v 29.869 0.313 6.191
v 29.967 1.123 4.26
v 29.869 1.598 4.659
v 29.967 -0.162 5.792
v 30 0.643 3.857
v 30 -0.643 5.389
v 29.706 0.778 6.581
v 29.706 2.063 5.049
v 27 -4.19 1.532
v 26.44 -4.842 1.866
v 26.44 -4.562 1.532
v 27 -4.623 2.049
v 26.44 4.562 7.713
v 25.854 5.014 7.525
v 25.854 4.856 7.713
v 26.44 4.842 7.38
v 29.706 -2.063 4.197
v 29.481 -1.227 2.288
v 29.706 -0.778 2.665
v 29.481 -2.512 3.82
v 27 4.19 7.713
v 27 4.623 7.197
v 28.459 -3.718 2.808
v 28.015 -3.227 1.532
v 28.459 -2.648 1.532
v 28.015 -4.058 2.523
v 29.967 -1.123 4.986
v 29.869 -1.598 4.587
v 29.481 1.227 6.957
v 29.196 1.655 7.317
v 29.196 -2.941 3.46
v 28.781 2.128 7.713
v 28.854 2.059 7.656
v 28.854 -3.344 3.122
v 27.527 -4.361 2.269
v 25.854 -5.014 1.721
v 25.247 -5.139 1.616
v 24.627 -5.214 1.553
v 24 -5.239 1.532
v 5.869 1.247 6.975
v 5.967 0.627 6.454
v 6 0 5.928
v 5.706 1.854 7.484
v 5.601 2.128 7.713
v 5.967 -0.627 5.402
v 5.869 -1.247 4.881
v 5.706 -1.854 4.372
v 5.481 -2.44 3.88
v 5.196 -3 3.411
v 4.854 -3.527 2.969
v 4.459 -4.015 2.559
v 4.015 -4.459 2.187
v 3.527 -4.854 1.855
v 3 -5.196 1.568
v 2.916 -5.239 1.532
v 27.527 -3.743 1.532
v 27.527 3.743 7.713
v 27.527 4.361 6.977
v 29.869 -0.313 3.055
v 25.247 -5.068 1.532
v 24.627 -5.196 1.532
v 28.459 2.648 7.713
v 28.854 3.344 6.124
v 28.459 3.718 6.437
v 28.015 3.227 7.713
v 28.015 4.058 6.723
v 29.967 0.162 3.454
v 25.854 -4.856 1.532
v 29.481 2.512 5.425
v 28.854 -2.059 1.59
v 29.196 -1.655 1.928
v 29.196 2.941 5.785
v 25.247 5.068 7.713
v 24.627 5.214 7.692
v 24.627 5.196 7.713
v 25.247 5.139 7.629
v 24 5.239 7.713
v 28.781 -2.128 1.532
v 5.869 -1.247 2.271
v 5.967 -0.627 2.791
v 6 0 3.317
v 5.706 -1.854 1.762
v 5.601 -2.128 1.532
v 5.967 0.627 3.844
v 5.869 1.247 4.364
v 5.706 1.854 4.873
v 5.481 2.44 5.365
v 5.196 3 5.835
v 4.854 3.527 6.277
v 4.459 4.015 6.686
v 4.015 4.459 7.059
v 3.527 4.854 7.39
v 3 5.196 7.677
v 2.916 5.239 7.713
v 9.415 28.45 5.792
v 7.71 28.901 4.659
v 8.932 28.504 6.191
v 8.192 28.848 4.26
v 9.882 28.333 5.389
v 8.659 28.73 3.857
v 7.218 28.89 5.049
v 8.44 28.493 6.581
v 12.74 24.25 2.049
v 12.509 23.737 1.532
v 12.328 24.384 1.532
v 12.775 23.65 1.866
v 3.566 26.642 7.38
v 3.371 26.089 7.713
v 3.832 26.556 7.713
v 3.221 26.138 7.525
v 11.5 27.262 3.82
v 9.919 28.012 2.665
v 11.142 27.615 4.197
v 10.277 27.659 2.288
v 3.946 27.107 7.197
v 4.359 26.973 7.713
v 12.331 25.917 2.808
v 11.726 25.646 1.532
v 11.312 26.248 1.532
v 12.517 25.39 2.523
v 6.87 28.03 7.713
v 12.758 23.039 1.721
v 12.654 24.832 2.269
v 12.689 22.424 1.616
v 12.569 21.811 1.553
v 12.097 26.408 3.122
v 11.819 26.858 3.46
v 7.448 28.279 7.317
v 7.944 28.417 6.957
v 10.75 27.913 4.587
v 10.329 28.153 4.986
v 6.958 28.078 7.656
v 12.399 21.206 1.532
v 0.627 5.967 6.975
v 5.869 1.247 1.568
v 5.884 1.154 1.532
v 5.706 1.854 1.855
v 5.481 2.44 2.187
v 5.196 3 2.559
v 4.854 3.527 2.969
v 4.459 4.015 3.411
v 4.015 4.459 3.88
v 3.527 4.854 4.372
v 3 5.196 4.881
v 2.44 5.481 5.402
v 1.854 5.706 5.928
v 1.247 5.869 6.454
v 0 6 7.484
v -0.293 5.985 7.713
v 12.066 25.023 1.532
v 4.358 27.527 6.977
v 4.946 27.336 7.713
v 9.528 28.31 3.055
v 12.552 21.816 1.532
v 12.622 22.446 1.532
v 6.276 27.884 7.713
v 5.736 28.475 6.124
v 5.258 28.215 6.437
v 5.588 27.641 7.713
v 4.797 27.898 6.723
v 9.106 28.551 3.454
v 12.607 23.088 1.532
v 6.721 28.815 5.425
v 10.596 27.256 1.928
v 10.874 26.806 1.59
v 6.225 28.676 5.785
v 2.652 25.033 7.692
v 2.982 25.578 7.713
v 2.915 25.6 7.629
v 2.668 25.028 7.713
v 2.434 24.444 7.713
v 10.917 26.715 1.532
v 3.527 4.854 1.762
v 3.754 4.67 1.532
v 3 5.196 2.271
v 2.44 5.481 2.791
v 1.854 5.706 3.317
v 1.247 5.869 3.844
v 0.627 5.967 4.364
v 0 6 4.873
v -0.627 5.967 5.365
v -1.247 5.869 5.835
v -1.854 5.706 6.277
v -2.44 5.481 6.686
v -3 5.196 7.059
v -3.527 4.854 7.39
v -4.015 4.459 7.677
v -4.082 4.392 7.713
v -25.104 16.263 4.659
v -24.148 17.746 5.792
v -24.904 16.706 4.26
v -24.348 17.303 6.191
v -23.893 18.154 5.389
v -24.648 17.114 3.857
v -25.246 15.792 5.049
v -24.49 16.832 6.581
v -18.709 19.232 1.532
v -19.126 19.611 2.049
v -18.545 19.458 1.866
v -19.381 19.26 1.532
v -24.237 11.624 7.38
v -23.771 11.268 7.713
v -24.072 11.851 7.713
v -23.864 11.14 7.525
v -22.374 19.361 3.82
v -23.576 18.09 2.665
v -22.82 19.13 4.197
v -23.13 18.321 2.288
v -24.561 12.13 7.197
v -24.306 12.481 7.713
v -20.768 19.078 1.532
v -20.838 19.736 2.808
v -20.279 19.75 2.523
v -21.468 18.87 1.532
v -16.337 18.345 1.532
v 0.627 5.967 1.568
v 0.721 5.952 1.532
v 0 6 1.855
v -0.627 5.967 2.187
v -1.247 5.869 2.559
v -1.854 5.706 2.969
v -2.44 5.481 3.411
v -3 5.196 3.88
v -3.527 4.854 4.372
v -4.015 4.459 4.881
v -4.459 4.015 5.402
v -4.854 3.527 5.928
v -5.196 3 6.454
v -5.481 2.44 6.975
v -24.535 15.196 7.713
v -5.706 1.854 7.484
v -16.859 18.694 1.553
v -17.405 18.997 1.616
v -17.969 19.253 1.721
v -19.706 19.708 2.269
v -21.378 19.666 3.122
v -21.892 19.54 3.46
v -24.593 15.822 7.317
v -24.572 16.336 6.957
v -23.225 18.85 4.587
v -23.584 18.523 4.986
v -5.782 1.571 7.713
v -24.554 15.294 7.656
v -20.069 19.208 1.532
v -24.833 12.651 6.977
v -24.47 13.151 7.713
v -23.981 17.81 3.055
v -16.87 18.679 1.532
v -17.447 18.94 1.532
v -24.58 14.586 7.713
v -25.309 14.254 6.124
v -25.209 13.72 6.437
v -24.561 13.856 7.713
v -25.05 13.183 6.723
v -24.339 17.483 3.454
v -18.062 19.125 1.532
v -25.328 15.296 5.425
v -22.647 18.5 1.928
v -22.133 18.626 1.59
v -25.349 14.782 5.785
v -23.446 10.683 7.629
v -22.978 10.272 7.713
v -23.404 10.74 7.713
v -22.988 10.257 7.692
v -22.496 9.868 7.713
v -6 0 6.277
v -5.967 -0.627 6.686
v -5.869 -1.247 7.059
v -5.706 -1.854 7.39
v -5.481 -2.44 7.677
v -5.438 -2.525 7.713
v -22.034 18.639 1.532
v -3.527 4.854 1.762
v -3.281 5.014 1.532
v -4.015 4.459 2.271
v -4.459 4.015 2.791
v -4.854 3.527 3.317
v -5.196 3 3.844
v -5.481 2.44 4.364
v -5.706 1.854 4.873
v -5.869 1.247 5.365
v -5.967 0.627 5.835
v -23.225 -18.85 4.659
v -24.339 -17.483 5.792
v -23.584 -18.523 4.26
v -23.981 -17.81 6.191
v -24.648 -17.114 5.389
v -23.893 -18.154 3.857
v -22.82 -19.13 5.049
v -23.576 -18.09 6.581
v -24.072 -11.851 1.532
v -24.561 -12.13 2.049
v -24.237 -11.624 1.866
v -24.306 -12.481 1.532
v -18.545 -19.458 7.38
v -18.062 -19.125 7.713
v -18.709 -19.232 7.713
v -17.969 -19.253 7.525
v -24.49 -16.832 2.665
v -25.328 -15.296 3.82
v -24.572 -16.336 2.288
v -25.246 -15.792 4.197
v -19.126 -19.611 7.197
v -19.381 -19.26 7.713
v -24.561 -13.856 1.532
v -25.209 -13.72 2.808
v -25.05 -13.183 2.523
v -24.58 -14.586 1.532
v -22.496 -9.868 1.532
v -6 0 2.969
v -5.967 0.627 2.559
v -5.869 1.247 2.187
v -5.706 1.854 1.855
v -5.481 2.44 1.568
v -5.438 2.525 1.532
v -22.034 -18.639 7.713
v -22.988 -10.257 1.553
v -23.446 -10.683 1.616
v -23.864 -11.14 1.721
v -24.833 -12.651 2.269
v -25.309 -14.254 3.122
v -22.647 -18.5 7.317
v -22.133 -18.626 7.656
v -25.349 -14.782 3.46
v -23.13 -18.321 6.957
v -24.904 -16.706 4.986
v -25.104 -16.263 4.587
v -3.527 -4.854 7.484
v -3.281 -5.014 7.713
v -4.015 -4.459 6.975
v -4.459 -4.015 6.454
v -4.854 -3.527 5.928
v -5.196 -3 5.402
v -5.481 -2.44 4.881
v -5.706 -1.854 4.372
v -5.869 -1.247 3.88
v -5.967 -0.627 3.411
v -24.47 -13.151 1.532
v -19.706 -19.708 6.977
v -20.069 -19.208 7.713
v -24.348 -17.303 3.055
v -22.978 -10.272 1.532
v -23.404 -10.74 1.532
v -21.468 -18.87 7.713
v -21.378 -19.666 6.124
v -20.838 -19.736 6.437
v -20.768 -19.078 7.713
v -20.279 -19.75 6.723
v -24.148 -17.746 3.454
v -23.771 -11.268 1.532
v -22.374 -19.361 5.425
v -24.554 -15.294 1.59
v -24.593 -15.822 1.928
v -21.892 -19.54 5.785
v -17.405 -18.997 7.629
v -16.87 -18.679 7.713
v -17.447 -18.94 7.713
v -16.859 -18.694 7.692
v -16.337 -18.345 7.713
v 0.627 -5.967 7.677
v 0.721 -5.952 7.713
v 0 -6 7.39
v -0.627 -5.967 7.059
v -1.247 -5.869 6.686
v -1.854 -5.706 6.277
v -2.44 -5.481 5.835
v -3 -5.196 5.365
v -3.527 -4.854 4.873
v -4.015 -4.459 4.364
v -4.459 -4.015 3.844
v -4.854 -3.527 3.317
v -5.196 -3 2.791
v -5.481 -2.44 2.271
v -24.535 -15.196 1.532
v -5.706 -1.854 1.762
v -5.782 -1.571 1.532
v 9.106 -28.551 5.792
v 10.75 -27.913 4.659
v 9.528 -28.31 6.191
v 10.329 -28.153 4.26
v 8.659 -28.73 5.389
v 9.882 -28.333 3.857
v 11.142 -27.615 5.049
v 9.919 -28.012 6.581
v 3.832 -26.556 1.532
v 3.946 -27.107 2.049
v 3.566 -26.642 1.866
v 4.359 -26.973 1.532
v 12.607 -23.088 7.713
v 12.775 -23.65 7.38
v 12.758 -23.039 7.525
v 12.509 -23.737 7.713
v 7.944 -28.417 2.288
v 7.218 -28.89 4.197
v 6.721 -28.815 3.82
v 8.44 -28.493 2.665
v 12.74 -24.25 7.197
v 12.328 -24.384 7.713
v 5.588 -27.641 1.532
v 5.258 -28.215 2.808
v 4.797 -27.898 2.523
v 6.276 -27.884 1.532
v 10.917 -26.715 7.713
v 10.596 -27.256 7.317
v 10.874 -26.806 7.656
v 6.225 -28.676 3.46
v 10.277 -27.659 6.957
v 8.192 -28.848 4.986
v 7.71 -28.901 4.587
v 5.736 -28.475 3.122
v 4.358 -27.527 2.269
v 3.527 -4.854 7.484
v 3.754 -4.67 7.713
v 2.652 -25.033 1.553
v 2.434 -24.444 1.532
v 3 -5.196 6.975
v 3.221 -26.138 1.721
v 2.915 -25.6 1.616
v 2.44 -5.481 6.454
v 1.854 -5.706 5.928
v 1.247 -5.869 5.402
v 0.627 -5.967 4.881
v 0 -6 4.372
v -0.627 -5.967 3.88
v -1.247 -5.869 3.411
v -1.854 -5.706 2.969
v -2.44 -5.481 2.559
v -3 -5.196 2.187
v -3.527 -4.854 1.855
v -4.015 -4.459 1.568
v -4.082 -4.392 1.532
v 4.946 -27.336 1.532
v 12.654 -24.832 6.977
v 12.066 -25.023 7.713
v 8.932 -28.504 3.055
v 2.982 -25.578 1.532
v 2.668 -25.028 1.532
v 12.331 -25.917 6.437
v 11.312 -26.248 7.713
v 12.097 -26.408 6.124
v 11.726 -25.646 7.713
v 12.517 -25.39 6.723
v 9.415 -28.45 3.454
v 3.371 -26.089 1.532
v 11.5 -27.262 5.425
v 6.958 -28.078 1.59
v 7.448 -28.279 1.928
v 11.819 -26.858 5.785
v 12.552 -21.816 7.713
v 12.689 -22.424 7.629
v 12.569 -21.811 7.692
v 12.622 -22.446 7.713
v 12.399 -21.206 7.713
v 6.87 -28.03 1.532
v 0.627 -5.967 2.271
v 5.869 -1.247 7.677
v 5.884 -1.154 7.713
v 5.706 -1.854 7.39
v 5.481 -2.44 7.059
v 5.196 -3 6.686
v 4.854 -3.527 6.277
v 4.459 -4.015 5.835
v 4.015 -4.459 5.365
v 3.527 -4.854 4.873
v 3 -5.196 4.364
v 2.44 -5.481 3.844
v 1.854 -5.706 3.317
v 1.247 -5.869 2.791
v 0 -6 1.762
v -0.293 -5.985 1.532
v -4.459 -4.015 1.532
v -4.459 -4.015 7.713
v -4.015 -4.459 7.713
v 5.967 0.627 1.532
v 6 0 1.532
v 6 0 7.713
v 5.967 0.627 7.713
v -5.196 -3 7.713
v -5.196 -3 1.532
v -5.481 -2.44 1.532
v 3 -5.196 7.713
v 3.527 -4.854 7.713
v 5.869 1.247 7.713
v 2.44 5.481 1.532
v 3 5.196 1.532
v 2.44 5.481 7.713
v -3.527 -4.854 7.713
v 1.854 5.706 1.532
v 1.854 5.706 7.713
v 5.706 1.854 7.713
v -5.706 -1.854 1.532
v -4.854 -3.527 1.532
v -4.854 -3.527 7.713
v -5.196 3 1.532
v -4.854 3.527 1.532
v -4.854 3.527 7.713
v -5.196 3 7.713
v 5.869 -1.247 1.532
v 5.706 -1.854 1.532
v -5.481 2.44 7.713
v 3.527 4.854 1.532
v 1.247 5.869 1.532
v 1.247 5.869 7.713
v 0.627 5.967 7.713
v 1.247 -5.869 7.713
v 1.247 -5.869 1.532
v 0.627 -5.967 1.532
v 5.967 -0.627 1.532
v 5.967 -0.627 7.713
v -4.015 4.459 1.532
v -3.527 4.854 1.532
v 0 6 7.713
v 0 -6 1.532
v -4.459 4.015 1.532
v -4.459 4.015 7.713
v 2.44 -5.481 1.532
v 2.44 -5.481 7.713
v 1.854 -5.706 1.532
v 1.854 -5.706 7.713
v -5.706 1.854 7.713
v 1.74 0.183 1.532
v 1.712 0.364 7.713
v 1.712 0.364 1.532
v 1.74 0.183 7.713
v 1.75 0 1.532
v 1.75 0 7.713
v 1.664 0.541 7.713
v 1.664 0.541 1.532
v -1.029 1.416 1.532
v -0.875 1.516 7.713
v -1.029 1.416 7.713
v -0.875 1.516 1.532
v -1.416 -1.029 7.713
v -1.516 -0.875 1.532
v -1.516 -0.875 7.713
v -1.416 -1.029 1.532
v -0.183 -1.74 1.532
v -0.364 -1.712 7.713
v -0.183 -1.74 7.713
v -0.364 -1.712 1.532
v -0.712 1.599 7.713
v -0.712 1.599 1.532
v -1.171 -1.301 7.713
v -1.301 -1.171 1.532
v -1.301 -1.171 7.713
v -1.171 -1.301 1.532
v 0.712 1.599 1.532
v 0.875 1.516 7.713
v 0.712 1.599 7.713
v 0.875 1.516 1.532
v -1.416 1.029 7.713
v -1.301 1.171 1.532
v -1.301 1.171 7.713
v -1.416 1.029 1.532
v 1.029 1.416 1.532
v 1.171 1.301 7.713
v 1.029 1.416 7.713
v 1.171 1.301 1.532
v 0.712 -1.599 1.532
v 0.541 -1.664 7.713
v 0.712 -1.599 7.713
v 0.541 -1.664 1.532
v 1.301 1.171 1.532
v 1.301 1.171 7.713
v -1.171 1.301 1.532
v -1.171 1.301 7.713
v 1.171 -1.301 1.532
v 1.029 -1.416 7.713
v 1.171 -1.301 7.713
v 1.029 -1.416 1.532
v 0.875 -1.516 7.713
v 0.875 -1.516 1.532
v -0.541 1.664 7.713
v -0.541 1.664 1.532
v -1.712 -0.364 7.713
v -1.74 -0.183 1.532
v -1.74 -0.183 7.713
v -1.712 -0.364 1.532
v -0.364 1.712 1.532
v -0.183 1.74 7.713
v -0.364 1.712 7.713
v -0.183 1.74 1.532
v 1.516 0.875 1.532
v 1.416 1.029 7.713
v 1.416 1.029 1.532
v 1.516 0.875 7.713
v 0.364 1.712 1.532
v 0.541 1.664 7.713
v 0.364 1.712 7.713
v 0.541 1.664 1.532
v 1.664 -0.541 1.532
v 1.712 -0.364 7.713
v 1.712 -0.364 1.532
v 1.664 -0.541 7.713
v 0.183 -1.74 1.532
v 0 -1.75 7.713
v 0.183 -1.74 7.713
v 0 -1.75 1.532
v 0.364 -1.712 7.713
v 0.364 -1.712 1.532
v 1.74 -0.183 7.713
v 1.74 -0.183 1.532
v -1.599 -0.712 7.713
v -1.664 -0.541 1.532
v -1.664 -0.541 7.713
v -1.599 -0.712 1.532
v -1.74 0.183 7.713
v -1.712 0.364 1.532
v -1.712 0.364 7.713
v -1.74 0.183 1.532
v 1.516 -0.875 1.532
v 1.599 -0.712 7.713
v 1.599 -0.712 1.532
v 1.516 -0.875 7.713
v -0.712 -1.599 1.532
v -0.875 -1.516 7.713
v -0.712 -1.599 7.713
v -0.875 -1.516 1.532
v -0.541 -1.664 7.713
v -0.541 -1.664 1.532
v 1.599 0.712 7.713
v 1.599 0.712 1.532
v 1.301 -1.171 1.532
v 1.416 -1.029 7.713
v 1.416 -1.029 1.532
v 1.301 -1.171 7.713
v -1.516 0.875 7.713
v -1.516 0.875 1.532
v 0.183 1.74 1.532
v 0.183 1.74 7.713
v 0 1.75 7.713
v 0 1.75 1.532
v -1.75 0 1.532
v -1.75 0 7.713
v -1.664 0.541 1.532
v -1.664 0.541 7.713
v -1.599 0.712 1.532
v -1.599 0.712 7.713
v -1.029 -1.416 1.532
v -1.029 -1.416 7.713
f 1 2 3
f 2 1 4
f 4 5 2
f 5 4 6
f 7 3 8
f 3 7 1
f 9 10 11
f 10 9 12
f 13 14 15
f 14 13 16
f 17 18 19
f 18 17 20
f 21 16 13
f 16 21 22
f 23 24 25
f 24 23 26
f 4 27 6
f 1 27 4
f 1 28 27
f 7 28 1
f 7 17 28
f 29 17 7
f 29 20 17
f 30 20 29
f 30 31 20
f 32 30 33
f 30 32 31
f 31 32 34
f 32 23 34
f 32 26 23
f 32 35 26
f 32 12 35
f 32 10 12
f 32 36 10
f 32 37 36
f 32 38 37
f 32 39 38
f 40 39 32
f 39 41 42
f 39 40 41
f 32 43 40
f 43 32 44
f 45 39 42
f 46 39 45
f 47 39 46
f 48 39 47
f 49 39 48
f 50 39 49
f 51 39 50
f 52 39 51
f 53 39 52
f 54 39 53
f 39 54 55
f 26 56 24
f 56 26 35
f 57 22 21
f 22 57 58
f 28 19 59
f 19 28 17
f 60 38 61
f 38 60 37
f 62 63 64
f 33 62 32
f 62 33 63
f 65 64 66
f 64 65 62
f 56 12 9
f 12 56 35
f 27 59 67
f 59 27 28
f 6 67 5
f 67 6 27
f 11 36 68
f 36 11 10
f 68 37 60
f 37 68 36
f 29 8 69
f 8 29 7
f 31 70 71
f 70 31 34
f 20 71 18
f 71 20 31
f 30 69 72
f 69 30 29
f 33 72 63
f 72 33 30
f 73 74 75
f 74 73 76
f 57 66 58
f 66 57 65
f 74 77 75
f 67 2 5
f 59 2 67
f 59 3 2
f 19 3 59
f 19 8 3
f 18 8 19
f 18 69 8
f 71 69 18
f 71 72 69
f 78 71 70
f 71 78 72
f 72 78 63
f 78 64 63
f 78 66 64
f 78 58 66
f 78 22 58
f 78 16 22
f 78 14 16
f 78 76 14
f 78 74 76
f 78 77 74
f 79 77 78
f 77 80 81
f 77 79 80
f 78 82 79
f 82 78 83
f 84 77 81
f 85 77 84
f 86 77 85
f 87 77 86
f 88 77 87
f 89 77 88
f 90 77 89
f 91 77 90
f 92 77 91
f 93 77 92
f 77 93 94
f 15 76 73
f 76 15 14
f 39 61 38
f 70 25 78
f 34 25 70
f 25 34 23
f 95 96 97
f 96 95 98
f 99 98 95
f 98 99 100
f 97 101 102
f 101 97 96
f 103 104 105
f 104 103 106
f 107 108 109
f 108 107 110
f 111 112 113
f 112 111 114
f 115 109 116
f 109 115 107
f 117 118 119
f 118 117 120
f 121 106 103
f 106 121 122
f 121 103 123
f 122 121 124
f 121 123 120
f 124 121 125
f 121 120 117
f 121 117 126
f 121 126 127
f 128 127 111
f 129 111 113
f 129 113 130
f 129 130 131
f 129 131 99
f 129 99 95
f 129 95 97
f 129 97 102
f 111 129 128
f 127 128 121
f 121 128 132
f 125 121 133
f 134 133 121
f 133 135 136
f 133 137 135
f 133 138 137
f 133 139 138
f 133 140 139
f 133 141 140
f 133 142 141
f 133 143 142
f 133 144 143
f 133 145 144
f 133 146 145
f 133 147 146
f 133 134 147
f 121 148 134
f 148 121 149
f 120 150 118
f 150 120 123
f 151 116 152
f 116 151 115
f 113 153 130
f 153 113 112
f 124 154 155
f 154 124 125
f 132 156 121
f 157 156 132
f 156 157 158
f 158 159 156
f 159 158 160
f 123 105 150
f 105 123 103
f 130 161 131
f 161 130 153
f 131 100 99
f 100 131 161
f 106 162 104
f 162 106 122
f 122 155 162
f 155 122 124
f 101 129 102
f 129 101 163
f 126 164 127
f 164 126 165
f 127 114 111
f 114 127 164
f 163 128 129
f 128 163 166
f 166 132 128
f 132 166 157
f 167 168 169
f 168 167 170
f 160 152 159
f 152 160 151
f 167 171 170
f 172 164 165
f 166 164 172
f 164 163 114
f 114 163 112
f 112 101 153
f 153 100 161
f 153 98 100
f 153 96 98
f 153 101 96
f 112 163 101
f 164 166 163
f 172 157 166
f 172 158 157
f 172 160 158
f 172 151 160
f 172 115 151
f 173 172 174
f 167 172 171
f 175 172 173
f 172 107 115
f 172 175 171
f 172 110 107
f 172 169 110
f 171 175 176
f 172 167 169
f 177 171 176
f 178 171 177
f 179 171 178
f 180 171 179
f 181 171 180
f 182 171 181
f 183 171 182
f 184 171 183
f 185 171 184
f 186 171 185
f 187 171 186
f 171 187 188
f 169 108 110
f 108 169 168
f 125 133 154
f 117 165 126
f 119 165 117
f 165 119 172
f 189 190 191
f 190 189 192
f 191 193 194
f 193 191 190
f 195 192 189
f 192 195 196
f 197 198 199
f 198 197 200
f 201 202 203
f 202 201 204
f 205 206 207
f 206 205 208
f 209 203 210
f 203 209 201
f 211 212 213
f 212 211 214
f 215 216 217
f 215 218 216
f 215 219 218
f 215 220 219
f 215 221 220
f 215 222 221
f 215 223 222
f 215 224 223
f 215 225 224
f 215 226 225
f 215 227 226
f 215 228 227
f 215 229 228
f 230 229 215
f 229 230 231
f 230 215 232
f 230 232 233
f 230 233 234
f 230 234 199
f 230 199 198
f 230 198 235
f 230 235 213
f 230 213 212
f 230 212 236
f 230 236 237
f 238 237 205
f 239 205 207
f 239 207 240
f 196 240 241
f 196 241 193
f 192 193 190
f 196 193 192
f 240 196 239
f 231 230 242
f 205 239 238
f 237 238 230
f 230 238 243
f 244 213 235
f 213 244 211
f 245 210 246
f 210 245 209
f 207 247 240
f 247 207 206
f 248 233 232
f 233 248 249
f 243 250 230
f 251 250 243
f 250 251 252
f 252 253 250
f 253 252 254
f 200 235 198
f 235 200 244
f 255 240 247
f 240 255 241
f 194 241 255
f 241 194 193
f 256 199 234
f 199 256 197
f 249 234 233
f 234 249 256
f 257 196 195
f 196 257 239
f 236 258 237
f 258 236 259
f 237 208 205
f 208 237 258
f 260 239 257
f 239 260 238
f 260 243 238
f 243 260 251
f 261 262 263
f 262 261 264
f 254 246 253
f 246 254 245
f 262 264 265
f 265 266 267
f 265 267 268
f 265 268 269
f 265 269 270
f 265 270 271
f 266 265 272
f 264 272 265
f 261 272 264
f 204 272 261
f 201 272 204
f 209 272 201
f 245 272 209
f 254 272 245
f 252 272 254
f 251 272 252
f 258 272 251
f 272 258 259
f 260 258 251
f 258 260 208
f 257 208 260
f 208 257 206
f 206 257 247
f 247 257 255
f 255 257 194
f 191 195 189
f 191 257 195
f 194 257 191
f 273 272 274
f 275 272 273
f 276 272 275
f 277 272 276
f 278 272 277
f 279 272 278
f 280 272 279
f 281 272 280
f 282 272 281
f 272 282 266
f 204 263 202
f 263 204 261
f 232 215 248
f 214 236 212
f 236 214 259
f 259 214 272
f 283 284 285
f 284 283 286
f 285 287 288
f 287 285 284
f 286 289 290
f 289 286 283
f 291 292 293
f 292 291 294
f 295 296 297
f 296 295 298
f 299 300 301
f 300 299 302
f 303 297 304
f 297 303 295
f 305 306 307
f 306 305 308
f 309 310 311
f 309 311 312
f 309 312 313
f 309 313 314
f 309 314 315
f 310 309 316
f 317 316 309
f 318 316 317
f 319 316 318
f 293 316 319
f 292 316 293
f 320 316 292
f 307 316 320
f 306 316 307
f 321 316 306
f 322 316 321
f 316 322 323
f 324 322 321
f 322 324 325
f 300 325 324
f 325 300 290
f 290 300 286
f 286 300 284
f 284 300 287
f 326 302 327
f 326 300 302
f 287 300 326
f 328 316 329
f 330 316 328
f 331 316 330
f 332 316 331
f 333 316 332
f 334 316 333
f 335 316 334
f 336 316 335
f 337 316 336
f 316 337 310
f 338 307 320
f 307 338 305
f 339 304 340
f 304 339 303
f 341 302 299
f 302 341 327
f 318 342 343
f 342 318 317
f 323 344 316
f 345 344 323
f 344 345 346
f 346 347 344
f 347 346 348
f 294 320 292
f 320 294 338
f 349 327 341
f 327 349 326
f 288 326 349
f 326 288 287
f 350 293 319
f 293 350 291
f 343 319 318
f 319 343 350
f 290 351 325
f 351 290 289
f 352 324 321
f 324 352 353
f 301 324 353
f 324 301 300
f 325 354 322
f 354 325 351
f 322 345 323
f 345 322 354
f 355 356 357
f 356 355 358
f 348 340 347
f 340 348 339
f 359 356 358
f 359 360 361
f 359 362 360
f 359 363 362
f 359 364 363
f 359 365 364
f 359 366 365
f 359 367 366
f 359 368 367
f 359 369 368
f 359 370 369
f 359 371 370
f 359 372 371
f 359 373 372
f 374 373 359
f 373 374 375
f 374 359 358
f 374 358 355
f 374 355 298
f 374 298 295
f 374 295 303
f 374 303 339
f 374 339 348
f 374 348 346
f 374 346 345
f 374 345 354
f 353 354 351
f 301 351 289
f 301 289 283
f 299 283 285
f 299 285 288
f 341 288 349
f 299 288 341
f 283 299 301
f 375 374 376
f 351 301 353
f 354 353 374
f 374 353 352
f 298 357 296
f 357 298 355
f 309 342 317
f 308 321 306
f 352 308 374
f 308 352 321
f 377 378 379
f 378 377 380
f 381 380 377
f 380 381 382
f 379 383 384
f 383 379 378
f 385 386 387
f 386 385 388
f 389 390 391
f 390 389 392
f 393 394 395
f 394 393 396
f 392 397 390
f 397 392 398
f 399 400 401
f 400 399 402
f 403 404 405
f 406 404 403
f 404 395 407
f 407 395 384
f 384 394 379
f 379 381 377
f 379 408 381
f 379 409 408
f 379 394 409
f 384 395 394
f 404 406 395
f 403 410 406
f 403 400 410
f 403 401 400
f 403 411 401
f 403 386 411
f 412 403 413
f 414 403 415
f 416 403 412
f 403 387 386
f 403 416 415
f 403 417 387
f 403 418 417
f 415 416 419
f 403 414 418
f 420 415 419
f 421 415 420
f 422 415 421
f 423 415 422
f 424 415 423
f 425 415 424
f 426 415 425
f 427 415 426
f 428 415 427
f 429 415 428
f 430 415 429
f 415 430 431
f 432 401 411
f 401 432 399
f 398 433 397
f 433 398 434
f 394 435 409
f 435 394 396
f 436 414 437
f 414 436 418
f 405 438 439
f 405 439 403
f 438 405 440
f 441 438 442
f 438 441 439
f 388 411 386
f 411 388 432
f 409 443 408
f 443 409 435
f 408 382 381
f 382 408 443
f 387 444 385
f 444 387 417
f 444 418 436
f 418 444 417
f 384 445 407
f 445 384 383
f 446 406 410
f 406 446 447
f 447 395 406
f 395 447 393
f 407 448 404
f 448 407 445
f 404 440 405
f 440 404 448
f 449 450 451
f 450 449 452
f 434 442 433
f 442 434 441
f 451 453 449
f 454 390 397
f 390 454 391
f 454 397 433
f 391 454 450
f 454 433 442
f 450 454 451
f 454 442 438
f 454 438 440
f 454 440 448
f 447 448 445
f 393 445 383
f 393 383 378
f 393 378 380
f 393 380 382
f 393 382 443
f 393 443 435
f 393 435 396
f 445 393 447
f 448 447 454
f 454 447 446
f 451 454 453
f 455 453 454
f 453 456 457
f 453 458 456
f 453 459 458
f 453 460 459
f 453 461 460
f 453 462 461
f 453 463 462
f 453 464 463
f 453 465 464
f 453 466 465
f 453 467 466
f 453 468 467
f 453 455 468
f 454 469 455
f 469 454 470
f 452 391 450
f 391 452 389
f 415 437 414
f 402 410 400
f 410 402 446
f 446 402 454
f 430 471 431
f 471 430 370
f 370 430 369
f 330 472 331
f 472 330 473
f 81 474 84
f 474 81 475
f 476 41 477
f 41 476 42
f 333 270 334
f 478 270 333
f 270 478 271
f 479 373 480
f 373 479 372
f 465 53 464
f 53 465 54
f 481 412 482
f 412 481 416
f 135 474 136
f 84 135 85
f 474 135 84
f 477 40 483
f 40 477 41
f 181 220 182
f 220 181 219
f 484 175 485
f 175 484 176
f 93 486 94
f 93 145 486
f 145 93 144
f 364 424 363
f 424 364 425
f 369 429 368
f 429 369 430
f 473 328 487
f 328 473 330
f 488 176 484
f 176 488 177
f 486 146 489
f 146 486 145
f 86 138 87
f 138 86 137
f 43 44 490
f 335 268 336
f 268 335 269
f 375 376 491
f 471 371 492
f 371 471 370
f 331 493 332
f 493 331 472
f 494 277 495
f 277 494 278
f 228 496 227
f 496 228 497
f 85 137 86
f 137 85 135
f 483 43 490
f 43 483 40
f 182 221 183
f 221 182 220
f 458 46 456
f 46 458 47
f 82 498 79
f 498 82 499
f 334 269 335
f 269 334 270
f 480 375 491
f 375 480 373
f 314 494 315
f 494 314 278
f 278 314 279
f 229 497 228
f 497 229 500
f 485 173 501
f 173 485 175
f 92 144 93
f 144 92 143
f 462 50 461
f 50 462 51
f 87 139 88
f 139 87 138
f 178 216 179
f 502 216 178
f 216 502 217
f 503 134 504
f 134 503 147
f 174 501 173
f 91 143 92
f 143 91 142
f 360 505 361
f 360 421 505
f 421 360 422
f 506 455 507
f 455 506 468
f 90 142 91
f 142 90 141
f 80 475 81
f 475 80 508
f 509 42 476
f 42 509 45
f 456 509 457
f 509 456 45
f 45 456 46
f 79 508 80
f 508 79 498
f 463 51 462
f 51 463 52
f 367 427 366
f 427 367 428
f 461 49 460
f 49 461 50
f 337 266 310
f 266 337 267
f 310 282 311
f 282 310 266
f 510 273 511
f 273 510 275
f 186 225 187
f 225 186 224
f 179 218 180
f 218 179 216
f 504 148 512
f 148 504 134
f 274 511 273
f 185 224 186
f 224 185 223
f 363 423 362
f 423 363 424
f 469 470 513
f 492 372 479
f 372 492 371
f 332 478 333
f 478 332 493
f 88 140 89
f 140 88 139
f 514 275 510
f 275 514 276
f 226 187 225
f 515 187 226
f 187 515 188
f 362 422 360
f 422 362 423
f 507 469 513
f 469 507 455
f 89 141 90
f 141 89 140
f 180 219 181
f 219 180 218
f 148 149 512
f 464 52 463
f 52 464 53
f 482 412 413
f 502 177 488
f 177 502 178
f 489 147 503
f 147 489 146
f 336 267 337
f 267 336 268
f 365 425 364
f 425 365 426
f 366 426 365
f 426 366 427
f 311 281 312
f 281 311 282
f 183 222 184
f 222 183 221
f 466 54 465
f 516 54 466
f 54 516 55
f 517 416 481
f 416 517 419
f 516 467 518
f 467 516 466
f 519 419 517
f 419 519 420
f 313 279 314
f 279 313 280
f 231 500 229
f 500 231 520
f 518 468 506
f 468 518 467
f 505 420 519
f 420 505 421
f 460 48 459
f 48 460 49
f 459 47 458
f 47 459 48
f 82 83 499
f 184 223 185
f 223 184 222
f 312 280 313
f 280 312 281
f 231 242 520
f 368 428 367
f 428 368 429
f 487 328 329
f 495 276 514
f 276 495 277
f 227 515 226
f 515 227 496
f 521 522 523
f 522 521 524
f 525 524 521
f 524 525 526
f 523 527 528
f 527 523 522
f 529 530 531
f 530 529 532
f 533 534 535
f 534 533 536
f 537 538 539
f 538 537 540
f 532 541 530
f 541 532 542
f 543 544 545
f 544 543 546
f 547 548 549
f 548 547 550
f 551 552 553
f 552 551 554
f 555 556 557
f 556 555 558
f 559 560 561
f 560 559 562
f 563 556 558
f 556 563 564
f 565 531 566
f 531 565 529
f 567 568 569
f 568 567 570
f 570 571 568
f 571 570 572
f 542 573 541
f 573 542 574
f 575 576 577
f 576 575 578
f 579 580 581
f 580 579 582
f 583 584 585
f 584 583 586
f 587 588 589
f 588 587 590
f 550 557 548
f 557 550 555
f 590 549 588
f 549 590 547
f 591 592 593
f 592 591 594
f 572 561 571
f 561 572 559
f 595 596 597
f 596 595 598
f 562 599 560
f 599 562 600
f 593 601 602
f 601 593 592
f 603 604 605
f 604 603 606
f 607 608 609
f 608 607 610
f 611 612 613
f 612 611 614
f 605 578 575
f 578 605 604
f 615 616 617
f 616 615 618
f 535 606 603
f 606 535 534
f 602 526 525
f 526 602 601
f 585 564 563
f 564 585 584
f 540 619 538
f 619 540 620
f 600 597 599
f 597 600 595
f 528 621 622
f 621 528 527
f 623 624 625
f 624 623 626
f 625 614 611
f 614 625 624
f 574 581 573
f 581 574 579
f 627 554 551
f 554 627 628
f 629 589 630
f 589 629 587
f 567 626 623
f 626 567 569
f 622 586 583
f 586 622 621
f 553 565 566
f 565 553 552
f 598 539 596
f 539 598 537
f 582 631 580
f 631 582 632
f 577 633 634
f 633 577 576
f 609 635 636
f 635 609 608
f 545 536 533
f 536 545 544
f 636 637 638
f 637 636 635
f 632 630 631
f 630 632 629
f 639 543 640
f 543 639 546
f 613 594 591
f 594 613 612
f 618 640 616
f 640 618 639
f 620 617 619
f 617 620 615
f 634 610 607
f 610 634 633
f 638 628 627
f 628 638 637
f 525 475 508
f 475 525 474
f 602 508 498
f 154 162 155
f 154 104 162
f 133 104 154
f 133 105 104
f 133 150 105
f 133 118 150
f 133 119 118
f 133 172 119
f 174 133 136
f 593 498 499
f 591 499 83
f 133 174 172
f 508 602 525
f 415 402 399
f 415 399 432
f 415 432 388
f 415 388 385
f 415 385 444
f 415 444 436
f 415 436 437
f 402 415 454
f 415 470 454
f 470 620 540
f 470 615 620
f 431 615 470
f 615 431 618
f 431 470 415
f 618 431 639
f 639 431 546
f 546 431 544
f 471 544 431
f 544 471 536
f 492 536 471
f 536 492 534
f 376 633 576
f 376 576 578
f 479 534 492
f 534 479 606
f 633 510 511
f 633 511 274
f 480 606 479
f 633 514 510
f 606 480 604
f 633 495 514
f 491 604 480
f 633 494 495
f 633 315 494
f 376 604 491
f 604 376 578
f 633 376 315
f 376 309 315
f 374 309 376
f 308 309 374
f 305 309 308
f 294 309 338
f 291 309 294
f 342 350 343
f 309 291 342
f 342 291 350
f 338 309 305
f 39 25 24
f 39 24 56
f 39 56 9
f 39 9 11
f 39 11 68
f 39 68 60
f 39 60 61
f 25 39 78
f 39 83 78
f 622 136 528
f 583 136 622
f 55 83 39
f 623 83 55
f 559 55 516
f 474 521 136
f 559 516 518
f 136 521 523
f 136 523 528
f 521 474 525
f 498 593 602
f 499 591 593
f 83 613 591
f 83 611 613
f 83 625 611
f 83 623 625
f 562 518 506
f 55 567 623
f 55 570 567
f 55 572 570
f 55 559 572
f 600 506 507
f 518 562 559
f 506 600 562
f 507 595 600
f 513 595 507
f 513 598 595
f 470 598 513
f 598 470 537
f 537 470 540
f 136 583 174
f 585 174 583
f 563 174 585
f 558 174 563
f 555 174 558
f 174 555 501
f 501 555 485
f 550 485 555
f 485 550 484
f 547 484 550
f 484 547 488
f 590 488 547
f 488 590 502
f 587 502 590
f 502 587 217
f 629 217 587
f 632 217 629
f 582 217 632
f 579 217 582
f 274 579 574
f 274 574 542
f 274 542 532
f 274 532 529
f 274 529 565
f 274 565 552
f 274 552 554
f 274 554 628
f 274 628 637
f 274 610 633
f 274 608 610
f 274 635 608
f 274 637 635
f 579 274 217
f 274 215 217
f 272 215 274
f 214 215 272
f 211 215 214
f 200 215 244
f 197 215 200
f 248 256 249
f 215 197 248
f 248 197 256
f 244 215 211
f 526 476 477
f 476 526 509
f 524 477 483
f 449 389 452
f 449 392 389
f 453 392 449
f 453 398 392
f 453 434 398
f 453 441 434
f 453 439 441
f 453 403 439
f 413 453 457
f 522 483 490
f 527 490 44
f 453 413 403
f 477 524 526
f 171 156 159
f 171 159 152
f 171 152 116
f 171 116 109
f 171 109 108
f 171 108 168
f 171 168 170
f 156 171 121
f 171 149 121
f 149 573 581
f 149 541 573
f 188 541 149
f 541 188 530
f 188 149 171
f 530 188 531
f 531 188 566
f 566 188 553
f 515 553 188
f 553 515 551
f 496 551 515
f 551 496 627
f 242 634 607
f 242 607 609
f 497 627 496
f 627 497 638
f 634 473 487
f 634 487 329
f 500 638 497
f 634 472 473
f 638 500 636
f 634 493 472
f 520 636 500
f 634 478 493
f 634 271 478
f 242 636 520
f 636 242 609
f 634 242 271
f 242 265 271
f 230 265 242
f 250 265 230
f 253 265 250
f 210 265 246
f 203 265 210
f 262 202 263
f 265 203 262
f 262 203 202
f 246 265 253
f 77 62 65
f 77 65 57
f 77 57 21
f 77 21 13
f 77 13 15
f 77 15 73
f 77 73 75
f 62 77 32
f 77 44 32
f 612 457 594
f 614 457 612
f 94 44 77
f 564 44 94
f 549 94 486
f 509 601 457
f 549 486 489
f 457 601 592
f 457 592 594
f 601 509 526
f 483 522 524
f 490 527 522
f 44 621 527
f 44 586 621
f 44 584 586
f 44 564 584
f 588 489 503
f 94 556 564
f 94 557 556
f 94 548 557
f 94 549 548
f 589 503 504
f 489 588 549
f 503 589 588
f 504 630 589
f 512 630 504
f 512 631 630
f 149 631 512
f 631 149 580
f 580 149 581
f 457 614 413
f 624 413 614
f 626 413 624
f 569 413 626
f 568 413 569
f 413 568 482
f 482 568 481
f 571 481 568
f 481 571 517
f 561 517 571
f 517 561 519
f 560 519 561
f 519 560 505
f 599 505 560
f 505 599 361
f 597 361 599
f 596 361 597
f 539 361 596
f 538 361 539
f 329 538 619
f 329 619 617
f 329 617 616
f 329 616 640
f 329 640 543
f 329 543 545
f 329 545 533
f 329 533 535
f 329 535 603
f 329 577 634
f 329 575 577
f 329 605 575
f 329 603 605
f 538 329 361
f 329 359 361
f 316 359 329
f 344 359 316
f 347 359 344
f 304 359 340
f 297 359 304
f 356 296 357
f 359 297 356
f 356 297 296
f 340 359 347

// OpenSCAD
eps = 0.01;
angle = 40 ;
blades = 5;
d = 12;
h = 2;
l = 30;

module blade()
{
  dx = l-d/2;
  off = d*cos(angle) - h*cos(90-angle);
  translate([0, -off/2, 0])
    rotate([angle, 0, 0])
      {
        translate([dx, d/2, 0])
          cylinder(d=d, h=h, $fn=60);
        cube([dx, d, h]);
      }
}


module screw()
{
  module base()
  {
    difference()
    {
      union()
      {
        // core
        cylinder(d=d, h=d, $fn=60);
        // blades
        for(r=[0:blades-1])
          rotate([0, 0, r*360/blades])
            blade();
      }
      // rod hole
      translate([0, 0, -eps])
        cylinder(d=3.5, h=d+2*eps, $fn=60);
    }
  }
  intersection()
  {
    q = d*sin(angle);
    dh = h*sin(90-angle);
    base();
    translate([0, 0, dh])
      cylinder(d=3*l, h=q-dh);
  }
}

screw();
//blade(10, 2, 20);
